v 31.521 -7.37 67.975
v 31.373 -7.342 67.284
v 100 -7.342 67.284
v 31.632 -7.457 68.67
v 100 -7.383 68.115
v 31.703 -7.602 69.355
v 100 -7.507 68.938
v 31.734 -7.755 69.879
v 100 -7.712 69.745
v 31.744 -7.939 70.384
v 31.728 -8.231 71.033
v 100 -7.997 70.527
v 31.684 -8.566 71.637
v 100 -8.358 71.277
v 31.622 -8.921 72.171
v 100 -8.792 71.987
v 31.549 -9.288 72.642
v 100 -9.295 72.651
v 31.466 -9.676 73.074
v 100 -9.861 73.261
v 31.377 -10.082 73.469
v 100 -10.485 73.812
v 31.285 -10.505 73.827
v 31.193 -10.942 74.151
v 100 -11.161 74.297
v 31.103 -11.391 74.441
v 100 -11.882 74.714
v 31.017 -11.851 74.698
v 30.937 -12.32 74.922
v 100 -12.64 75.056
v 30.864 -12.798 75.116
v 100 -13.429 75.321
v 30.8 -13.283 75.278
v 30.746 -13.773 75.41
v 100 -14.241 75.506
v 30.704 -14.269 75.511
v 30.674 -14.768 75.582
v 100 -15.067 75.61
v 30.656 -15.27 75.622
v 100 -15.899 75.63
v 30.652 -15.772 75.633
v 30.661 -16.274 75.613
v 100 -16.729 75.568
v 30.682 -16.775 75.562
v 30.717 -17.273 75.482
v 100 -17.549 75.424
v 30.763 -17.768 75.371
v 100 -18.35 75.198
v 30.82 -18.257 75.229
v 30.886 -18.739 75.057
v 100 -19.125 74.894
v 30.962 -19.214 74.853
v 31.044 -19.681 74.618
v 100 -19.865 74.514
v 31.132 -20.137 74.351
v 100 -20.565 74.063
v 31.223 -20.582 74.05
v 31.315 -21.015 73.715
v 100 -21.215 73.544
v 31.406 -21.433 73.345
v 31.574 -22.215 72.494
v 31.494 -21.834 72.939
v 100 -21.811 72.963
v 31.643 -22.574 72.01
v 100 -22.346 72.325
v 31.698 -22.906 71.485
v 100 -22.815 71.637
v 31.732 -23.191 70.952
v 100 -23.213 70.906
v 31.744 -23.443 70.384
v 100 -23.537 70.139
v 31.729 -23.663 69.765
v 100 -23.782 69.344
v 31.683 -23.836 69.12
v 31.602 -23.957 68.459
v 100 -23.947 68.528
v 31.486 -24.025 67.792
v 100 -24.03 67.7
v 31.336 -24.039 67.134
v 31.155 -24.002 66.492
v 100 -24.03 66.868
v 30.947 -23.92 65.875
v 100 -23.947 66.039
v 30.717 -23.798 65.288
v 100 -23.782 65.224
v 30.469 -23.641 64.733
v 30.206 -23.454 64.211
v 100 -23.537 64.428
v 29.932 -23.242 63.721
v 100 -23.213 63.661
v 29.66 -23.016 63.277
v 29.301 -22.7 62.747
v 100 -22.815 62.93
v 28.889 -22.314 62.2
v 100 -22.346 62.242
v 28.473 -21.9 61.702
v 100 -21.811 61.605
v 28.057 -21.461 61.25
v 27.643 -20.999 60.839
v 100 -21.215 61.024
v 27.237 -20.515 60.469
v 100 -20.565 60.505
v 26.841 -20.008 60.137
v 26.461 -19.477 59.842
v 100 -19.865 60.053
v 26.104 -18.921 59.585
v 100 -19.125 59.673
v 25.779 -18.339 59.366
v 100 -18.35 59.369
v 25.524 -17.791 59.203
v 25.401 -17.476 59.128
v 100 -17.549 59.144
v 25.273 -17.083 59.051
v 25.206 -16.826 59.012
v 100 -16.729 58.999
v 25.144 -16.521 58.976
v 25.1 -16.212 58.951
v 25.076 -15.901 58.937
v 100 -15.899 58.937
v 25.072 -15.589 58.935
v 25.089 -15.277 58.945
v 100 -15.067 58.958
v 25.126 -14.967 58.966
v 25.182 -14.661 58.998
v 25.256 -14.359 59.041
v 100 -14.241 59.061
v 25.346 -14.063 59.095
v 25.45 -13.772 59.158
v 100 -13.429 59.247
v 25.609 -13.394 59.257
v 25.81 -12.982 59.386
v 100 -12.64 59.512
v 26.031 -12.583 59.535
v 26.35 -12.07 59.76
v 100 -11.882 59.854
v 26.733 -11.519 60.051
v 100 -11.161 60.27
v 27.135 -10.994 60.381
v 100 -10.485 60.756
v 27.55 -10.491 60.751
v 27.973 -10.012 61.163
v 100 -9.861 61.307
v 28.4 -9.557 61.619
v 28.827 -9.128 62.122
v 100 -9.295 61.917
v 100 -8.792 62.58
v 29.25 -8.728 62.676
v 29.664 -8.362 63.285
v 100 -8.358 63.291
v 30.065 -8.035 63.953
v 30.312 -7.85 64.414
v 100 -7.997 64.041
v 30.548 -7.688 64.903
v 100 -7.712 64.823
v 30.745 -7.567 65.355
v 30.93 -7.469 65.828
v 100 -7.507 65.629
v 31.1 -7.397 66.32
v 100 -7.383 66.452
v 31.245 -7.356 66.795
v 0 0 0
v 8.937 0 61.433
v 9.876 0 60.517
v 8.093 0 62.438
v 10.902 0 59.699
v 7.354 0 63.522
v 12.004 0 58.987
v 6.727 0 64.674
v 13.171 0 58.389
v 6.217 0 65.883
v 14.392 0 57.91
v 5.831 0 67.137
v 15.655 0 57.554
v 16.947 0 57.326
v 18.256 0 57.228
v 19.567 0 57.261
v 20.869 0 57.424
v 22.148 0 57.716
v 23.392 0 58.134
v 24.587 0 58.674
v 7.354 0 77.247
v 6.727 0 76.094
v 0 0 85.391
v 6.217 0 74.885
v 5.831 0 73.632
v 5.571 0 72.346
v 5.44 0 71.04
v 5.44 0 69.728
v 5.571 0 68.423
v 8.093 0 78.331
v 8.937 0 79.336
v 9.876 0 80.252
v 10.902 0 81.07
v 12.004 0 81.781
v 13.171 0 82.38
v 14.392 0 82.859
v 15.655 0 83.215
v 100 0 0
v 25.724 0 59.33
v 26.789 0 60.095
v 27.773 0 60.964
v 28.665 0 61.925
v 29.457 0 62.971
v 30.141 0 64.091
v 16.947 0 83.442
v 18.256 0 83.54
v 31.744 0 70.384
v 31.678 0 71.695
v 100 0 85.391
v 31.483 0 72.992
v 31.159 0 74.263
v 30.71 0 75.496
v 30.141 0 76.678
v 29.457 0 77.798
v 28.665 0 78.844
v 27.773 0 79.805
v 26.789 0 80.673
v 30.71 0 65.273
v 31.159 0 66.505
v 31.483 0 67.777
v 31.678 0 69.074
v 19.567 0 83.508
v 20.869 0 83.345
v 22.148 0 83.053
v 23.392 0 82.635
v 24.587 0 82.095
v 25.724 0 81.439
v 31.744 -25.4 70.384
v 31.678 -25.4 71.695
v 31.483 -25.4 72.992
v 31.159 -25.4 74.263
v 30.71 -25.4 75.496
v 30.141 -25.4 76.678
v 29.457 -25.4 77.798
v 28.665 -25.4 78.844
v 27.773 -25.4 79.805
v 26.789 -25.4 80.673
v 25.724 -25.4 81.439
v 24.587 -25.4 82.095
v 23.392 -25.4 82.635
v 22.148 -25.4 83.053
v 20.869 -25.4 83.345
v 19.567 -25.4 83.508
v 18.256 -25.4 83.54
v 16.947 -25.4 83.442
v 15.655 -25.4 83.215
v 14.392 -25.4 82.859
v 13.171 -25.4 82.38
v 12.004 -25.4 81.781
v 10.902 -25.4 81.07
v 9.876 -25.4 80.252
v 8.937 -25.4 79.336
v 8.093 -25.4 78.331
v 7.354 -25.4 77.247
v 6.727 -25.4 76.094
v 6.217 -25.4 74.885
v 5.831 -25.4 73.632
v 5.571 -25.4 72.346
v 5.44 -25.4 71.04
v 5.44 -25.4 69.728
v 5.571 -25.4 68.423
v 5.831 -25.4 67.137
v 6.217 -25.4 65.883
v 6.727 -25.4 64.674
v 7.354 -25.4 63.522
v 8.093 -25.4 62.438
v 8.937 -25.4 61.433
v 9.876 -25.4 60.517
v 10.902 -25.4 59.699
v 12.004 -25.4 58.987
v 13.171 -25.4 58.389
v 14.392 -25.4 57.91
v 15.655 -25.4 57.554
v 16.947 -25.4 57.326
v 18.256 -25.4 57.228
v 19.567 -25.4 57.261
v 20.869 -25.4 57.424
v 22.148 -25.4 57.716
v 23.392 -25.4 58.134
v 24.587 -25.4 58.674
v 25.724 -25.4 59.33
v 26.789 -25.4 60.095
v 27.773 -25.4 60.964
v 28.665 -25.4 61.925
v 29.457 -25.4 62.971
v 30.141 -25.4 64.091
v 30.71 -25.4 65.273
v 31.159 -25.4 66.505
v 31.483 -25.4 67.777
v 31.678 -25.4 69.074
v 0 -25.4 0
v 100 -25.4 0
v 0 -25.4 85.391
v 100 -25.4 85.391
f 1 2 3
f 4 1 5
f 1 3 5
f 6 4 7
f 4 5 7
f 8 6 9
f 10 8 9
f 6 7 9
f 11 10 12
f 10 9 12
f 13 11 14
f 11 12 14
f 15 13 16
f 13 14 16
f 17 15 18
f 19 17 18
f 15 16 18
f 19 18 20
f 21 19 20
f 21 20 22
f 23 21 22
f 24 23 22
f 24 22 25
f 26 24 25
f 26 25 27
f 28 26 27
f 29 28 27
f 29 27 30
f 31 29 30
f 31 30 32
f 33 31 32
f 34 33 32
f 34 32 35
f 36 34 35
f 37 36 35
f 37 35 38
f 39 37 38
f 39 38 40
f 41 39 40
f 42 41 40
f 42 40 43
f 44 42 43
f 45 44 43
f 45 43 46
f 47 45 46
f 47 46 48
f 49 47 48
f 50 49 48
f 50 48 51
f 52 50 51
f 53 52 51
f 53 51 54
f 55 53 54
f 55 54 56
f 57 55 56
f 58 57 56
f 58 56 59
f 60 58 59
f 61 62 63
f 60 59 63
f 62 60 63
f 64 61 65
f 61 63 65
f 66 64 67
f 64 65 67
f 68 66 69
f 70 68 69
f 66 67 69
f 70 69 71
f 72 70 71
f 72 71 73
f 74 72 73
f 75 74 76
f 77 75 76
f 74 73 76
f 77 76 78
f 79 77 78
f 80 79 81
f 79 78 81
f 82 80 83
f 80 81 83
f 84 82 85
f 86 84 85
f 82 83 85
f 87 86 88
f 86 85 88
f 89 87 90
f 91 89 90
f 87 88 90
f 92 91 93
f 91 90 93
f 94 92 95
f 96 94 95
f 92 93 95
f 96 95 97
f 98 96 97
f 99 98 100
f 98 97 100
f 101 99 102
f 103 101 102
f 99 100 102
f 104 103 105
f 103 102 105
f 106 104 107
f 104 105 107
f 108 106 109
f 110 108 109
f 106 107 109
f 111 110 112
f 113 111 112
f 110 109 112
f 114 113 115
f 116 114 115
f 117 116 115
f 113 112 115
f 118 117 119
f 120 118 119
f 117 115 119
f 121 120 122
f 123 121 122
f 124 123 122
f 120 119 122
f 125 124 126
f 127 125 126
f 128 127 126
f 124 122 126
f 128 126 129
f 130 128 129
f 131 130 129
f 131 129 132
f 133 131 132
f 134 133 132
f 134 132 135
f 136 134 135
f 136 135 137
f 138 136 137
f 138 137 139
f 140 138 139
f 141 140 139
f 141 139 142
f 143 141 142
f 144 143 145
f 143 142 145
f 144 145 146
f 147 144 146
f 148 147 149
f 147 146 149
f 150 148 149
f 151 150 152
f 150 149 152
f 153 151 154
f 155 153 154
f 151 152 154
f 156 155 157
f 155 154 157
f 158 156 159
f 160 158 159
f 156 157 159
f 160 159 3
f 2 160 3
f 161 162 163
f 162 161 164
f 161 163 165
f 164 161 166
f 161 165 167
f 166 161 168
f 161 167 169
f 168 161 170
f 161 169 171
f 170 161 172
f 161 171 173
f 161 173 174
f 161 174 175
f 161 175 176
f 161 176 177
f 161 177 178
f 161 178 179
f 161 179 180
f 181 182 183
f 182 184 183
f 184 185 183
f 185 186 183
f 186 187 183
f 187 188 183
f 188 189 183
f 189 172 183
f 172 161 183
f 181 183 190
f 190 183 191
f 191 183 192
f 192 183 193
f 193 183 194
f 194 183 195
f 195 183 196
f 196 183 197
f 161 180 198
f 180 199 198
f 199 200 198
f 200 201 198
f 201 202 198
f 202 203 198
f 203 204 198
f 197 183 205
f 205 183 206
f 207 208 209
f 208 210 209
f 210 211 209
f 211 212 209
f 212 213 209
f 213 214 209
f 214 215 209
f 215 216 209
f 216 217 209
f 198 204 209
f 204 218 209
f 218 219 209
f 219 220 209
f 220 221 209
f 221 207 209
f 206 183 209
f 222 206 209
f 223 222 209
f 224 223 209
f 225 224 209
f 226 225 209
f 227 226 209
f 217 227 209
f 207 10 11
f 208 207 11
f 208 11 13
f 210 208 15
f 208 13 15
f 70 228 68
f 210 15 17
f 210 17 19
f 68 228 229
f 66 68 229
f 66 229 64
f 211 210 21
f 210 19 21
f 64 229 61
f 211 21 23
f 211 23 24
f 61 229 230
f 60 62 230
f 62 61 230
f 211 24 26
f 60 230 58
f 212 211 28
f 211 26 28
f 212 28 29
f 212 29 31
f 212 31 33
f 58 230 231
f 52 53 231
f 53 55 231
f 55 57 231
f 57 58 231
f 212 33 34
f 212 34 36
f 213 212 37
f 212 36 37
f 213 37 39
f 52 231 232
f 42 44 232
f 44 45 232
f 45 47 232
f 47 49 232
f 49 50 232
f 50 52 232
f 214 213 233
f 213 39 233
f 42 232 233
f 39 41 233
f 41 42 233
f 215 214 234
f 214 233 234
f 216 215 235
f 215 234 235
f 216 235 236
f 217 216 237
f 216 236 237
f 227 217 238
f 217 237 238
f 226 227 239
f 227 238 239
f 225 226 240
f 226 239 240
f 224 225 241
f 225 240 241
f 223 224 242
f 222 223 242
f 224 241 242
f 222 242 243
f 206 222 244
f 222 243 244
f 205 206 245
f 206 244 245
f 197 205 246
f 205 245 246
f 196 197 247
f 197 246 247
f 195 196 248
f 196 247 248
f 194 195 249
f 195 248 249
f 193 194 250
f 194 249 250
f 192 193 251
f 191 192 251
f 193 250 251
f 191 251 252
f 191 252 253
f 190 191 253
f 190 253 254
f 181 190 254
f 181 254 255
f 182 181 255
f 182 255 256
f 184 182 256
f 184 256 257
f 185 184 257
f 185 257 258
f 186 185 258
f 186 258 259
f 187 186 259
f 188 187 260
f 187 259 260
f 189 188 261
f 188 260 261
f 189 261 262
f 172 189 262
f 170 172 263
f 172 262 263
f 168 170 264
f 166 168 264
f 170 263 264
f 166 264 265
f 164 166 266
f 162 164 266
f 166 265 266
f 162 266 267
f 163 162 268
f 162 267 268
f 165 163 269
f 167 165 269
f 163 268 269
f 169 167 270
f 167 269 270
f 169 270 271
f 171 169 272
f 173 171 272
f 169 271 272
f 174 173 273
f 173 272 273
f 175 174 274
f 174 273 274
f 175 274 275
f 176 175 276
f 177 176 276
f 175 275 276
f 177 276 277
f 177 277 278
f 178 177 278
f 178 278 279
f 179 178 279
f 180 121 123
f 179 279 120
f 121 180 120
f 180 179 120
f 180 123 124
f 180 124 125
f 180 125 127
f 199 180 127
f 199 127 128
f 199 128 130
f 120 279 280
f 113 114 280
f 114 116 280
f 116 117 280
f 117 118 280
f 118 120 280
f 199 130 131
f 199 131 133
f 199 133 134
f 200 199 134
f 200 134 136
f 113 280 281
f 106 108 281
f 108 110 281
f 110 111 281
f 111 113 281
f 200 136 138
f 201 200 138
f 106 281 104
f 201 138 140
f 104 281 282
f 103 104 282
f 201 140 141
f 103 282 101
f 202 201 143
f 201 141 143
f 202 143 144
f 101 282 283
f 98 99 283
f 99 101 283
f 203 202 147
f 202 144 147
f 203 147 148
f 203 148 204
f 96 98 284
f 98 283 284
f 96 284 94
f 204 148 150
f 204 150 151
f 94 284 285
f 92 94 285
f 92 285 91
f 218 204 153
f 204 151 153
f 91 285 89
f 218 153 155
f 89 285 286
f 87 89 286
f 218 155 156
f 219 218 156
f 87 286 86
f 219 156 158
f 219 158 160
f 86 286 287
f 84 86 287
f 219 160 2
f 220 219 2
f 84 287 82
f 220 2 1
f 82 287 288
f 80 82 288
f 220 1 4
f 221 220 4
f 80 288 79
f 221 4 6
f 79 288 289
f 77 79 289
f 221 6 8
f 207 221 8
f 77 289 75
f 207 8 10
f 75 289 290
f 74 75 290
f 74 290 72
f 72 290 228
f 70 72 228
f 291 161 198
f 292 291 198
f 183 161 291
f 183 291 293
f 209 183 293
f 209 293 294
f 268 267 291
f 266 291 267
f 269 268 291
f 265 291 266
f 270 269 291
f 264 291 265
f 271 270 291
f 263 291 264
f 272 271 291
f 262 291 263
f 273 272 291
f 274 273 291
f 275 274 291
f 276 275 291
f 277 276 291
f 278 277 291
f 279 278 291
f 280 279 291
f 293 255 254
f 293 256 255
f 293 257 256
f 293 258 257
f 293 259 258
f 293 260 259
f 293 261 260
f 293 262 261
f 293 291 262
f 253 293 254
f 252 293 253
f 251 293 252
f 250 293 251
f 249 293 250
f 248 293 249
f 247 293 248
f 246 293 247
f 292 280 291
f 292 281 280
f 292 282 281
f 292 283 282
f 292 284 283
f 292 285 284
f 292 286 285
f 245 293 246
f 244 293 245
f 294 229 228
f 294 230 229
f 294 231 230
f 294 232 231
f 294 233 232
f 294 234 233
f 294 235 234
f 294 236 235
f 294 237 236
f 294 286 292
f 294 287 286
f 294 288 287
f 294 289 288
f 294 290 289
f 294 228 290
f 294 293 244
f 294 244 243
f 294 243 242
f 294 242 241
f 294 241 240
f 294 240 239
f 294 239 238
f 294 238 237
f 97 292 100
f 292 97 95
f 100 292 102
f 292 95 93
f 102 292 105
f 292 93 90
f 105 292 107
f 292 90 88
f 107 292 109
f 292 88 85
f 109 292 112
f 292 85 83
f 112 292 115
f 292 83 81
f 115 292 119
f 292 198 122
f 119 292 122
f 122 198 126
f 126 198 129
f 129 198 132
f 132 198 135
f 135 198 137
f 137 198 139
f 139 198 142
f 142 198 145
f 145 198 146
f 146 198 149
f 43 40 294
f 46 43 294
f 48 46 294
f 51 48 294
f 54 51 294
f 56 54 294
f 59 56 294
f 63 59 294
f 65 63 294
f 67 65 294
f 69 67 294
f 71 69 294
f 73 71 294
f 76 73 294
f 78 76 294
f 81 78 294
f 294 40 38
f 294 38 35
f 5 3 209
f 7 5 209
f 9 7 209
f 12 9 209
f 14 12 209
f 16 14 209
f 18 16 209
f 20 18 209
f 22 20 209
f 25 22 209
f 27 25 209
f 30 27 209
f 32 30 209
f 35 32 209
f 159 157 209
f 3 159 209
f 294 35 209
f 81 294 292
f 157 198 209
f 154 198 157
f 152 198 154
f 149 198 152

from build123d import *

# Parameters (mm, degrees)
F0_W     = 100
F0_H     = 85.3913038855
F1_DEPTH = 25.4
F2_R     = 13.1600821693
F3_DEPTH = 25.4
F4_R     = 8.3492682179
F5_DEPTH = 25.4
F6_DEPTH = 25.4
F7_DEPTH = 25.4


with BuildPart() as f1:
    # F0 (on Front) → F1 (new body)
    with BuildSketch(Plane.XZ):
        with Locations((50, 42.6956519428)):
            Rectangle(F0_W, F0_H)
    extrude(amount=F1_DEPTH)

    # F2 (on face) → F3 (cut)
    with BuildSketch(Plane.XZ.offset(25.4)):
        with Locations((18.5836926103, 70.3844353557)):
            Circle(F2_R)
    extrude(amount=-F3_DEPTH, mode=Mode.SUBTRACT)

    # F4 (on face) → F5 (cut)
    with BuildSketch(Plane.YZ.offset(100)):
        with Locations((-15.6908016652, 67.2837793827)):
            Circle(F4_R)
    extrude(amount=-F5_DEPTH, mode=Mode.SUBTRACT)

    # F6 (cut): a face of the model
    f6_faces = [f1.faces().sort_by_distance(p)[0] for p in [
        (74.6, -15.6908016652, 67.2837793827),
    ]]
    extrude(f6_faces, amount=-F6_DEPTH, mode=Mode.SUBTRACT)

    # F7 (cut): a face of the model
    f7_faces = [f1.faces().sort_by_distance(p)[0] for p in [
        (49.2, -15.6908016652, 67.2837793827),
    ]]
    extrude(f7_faces, amount=-F7_DEPTH, mode=Mode.SUBTRACT)


solid = f1.part
